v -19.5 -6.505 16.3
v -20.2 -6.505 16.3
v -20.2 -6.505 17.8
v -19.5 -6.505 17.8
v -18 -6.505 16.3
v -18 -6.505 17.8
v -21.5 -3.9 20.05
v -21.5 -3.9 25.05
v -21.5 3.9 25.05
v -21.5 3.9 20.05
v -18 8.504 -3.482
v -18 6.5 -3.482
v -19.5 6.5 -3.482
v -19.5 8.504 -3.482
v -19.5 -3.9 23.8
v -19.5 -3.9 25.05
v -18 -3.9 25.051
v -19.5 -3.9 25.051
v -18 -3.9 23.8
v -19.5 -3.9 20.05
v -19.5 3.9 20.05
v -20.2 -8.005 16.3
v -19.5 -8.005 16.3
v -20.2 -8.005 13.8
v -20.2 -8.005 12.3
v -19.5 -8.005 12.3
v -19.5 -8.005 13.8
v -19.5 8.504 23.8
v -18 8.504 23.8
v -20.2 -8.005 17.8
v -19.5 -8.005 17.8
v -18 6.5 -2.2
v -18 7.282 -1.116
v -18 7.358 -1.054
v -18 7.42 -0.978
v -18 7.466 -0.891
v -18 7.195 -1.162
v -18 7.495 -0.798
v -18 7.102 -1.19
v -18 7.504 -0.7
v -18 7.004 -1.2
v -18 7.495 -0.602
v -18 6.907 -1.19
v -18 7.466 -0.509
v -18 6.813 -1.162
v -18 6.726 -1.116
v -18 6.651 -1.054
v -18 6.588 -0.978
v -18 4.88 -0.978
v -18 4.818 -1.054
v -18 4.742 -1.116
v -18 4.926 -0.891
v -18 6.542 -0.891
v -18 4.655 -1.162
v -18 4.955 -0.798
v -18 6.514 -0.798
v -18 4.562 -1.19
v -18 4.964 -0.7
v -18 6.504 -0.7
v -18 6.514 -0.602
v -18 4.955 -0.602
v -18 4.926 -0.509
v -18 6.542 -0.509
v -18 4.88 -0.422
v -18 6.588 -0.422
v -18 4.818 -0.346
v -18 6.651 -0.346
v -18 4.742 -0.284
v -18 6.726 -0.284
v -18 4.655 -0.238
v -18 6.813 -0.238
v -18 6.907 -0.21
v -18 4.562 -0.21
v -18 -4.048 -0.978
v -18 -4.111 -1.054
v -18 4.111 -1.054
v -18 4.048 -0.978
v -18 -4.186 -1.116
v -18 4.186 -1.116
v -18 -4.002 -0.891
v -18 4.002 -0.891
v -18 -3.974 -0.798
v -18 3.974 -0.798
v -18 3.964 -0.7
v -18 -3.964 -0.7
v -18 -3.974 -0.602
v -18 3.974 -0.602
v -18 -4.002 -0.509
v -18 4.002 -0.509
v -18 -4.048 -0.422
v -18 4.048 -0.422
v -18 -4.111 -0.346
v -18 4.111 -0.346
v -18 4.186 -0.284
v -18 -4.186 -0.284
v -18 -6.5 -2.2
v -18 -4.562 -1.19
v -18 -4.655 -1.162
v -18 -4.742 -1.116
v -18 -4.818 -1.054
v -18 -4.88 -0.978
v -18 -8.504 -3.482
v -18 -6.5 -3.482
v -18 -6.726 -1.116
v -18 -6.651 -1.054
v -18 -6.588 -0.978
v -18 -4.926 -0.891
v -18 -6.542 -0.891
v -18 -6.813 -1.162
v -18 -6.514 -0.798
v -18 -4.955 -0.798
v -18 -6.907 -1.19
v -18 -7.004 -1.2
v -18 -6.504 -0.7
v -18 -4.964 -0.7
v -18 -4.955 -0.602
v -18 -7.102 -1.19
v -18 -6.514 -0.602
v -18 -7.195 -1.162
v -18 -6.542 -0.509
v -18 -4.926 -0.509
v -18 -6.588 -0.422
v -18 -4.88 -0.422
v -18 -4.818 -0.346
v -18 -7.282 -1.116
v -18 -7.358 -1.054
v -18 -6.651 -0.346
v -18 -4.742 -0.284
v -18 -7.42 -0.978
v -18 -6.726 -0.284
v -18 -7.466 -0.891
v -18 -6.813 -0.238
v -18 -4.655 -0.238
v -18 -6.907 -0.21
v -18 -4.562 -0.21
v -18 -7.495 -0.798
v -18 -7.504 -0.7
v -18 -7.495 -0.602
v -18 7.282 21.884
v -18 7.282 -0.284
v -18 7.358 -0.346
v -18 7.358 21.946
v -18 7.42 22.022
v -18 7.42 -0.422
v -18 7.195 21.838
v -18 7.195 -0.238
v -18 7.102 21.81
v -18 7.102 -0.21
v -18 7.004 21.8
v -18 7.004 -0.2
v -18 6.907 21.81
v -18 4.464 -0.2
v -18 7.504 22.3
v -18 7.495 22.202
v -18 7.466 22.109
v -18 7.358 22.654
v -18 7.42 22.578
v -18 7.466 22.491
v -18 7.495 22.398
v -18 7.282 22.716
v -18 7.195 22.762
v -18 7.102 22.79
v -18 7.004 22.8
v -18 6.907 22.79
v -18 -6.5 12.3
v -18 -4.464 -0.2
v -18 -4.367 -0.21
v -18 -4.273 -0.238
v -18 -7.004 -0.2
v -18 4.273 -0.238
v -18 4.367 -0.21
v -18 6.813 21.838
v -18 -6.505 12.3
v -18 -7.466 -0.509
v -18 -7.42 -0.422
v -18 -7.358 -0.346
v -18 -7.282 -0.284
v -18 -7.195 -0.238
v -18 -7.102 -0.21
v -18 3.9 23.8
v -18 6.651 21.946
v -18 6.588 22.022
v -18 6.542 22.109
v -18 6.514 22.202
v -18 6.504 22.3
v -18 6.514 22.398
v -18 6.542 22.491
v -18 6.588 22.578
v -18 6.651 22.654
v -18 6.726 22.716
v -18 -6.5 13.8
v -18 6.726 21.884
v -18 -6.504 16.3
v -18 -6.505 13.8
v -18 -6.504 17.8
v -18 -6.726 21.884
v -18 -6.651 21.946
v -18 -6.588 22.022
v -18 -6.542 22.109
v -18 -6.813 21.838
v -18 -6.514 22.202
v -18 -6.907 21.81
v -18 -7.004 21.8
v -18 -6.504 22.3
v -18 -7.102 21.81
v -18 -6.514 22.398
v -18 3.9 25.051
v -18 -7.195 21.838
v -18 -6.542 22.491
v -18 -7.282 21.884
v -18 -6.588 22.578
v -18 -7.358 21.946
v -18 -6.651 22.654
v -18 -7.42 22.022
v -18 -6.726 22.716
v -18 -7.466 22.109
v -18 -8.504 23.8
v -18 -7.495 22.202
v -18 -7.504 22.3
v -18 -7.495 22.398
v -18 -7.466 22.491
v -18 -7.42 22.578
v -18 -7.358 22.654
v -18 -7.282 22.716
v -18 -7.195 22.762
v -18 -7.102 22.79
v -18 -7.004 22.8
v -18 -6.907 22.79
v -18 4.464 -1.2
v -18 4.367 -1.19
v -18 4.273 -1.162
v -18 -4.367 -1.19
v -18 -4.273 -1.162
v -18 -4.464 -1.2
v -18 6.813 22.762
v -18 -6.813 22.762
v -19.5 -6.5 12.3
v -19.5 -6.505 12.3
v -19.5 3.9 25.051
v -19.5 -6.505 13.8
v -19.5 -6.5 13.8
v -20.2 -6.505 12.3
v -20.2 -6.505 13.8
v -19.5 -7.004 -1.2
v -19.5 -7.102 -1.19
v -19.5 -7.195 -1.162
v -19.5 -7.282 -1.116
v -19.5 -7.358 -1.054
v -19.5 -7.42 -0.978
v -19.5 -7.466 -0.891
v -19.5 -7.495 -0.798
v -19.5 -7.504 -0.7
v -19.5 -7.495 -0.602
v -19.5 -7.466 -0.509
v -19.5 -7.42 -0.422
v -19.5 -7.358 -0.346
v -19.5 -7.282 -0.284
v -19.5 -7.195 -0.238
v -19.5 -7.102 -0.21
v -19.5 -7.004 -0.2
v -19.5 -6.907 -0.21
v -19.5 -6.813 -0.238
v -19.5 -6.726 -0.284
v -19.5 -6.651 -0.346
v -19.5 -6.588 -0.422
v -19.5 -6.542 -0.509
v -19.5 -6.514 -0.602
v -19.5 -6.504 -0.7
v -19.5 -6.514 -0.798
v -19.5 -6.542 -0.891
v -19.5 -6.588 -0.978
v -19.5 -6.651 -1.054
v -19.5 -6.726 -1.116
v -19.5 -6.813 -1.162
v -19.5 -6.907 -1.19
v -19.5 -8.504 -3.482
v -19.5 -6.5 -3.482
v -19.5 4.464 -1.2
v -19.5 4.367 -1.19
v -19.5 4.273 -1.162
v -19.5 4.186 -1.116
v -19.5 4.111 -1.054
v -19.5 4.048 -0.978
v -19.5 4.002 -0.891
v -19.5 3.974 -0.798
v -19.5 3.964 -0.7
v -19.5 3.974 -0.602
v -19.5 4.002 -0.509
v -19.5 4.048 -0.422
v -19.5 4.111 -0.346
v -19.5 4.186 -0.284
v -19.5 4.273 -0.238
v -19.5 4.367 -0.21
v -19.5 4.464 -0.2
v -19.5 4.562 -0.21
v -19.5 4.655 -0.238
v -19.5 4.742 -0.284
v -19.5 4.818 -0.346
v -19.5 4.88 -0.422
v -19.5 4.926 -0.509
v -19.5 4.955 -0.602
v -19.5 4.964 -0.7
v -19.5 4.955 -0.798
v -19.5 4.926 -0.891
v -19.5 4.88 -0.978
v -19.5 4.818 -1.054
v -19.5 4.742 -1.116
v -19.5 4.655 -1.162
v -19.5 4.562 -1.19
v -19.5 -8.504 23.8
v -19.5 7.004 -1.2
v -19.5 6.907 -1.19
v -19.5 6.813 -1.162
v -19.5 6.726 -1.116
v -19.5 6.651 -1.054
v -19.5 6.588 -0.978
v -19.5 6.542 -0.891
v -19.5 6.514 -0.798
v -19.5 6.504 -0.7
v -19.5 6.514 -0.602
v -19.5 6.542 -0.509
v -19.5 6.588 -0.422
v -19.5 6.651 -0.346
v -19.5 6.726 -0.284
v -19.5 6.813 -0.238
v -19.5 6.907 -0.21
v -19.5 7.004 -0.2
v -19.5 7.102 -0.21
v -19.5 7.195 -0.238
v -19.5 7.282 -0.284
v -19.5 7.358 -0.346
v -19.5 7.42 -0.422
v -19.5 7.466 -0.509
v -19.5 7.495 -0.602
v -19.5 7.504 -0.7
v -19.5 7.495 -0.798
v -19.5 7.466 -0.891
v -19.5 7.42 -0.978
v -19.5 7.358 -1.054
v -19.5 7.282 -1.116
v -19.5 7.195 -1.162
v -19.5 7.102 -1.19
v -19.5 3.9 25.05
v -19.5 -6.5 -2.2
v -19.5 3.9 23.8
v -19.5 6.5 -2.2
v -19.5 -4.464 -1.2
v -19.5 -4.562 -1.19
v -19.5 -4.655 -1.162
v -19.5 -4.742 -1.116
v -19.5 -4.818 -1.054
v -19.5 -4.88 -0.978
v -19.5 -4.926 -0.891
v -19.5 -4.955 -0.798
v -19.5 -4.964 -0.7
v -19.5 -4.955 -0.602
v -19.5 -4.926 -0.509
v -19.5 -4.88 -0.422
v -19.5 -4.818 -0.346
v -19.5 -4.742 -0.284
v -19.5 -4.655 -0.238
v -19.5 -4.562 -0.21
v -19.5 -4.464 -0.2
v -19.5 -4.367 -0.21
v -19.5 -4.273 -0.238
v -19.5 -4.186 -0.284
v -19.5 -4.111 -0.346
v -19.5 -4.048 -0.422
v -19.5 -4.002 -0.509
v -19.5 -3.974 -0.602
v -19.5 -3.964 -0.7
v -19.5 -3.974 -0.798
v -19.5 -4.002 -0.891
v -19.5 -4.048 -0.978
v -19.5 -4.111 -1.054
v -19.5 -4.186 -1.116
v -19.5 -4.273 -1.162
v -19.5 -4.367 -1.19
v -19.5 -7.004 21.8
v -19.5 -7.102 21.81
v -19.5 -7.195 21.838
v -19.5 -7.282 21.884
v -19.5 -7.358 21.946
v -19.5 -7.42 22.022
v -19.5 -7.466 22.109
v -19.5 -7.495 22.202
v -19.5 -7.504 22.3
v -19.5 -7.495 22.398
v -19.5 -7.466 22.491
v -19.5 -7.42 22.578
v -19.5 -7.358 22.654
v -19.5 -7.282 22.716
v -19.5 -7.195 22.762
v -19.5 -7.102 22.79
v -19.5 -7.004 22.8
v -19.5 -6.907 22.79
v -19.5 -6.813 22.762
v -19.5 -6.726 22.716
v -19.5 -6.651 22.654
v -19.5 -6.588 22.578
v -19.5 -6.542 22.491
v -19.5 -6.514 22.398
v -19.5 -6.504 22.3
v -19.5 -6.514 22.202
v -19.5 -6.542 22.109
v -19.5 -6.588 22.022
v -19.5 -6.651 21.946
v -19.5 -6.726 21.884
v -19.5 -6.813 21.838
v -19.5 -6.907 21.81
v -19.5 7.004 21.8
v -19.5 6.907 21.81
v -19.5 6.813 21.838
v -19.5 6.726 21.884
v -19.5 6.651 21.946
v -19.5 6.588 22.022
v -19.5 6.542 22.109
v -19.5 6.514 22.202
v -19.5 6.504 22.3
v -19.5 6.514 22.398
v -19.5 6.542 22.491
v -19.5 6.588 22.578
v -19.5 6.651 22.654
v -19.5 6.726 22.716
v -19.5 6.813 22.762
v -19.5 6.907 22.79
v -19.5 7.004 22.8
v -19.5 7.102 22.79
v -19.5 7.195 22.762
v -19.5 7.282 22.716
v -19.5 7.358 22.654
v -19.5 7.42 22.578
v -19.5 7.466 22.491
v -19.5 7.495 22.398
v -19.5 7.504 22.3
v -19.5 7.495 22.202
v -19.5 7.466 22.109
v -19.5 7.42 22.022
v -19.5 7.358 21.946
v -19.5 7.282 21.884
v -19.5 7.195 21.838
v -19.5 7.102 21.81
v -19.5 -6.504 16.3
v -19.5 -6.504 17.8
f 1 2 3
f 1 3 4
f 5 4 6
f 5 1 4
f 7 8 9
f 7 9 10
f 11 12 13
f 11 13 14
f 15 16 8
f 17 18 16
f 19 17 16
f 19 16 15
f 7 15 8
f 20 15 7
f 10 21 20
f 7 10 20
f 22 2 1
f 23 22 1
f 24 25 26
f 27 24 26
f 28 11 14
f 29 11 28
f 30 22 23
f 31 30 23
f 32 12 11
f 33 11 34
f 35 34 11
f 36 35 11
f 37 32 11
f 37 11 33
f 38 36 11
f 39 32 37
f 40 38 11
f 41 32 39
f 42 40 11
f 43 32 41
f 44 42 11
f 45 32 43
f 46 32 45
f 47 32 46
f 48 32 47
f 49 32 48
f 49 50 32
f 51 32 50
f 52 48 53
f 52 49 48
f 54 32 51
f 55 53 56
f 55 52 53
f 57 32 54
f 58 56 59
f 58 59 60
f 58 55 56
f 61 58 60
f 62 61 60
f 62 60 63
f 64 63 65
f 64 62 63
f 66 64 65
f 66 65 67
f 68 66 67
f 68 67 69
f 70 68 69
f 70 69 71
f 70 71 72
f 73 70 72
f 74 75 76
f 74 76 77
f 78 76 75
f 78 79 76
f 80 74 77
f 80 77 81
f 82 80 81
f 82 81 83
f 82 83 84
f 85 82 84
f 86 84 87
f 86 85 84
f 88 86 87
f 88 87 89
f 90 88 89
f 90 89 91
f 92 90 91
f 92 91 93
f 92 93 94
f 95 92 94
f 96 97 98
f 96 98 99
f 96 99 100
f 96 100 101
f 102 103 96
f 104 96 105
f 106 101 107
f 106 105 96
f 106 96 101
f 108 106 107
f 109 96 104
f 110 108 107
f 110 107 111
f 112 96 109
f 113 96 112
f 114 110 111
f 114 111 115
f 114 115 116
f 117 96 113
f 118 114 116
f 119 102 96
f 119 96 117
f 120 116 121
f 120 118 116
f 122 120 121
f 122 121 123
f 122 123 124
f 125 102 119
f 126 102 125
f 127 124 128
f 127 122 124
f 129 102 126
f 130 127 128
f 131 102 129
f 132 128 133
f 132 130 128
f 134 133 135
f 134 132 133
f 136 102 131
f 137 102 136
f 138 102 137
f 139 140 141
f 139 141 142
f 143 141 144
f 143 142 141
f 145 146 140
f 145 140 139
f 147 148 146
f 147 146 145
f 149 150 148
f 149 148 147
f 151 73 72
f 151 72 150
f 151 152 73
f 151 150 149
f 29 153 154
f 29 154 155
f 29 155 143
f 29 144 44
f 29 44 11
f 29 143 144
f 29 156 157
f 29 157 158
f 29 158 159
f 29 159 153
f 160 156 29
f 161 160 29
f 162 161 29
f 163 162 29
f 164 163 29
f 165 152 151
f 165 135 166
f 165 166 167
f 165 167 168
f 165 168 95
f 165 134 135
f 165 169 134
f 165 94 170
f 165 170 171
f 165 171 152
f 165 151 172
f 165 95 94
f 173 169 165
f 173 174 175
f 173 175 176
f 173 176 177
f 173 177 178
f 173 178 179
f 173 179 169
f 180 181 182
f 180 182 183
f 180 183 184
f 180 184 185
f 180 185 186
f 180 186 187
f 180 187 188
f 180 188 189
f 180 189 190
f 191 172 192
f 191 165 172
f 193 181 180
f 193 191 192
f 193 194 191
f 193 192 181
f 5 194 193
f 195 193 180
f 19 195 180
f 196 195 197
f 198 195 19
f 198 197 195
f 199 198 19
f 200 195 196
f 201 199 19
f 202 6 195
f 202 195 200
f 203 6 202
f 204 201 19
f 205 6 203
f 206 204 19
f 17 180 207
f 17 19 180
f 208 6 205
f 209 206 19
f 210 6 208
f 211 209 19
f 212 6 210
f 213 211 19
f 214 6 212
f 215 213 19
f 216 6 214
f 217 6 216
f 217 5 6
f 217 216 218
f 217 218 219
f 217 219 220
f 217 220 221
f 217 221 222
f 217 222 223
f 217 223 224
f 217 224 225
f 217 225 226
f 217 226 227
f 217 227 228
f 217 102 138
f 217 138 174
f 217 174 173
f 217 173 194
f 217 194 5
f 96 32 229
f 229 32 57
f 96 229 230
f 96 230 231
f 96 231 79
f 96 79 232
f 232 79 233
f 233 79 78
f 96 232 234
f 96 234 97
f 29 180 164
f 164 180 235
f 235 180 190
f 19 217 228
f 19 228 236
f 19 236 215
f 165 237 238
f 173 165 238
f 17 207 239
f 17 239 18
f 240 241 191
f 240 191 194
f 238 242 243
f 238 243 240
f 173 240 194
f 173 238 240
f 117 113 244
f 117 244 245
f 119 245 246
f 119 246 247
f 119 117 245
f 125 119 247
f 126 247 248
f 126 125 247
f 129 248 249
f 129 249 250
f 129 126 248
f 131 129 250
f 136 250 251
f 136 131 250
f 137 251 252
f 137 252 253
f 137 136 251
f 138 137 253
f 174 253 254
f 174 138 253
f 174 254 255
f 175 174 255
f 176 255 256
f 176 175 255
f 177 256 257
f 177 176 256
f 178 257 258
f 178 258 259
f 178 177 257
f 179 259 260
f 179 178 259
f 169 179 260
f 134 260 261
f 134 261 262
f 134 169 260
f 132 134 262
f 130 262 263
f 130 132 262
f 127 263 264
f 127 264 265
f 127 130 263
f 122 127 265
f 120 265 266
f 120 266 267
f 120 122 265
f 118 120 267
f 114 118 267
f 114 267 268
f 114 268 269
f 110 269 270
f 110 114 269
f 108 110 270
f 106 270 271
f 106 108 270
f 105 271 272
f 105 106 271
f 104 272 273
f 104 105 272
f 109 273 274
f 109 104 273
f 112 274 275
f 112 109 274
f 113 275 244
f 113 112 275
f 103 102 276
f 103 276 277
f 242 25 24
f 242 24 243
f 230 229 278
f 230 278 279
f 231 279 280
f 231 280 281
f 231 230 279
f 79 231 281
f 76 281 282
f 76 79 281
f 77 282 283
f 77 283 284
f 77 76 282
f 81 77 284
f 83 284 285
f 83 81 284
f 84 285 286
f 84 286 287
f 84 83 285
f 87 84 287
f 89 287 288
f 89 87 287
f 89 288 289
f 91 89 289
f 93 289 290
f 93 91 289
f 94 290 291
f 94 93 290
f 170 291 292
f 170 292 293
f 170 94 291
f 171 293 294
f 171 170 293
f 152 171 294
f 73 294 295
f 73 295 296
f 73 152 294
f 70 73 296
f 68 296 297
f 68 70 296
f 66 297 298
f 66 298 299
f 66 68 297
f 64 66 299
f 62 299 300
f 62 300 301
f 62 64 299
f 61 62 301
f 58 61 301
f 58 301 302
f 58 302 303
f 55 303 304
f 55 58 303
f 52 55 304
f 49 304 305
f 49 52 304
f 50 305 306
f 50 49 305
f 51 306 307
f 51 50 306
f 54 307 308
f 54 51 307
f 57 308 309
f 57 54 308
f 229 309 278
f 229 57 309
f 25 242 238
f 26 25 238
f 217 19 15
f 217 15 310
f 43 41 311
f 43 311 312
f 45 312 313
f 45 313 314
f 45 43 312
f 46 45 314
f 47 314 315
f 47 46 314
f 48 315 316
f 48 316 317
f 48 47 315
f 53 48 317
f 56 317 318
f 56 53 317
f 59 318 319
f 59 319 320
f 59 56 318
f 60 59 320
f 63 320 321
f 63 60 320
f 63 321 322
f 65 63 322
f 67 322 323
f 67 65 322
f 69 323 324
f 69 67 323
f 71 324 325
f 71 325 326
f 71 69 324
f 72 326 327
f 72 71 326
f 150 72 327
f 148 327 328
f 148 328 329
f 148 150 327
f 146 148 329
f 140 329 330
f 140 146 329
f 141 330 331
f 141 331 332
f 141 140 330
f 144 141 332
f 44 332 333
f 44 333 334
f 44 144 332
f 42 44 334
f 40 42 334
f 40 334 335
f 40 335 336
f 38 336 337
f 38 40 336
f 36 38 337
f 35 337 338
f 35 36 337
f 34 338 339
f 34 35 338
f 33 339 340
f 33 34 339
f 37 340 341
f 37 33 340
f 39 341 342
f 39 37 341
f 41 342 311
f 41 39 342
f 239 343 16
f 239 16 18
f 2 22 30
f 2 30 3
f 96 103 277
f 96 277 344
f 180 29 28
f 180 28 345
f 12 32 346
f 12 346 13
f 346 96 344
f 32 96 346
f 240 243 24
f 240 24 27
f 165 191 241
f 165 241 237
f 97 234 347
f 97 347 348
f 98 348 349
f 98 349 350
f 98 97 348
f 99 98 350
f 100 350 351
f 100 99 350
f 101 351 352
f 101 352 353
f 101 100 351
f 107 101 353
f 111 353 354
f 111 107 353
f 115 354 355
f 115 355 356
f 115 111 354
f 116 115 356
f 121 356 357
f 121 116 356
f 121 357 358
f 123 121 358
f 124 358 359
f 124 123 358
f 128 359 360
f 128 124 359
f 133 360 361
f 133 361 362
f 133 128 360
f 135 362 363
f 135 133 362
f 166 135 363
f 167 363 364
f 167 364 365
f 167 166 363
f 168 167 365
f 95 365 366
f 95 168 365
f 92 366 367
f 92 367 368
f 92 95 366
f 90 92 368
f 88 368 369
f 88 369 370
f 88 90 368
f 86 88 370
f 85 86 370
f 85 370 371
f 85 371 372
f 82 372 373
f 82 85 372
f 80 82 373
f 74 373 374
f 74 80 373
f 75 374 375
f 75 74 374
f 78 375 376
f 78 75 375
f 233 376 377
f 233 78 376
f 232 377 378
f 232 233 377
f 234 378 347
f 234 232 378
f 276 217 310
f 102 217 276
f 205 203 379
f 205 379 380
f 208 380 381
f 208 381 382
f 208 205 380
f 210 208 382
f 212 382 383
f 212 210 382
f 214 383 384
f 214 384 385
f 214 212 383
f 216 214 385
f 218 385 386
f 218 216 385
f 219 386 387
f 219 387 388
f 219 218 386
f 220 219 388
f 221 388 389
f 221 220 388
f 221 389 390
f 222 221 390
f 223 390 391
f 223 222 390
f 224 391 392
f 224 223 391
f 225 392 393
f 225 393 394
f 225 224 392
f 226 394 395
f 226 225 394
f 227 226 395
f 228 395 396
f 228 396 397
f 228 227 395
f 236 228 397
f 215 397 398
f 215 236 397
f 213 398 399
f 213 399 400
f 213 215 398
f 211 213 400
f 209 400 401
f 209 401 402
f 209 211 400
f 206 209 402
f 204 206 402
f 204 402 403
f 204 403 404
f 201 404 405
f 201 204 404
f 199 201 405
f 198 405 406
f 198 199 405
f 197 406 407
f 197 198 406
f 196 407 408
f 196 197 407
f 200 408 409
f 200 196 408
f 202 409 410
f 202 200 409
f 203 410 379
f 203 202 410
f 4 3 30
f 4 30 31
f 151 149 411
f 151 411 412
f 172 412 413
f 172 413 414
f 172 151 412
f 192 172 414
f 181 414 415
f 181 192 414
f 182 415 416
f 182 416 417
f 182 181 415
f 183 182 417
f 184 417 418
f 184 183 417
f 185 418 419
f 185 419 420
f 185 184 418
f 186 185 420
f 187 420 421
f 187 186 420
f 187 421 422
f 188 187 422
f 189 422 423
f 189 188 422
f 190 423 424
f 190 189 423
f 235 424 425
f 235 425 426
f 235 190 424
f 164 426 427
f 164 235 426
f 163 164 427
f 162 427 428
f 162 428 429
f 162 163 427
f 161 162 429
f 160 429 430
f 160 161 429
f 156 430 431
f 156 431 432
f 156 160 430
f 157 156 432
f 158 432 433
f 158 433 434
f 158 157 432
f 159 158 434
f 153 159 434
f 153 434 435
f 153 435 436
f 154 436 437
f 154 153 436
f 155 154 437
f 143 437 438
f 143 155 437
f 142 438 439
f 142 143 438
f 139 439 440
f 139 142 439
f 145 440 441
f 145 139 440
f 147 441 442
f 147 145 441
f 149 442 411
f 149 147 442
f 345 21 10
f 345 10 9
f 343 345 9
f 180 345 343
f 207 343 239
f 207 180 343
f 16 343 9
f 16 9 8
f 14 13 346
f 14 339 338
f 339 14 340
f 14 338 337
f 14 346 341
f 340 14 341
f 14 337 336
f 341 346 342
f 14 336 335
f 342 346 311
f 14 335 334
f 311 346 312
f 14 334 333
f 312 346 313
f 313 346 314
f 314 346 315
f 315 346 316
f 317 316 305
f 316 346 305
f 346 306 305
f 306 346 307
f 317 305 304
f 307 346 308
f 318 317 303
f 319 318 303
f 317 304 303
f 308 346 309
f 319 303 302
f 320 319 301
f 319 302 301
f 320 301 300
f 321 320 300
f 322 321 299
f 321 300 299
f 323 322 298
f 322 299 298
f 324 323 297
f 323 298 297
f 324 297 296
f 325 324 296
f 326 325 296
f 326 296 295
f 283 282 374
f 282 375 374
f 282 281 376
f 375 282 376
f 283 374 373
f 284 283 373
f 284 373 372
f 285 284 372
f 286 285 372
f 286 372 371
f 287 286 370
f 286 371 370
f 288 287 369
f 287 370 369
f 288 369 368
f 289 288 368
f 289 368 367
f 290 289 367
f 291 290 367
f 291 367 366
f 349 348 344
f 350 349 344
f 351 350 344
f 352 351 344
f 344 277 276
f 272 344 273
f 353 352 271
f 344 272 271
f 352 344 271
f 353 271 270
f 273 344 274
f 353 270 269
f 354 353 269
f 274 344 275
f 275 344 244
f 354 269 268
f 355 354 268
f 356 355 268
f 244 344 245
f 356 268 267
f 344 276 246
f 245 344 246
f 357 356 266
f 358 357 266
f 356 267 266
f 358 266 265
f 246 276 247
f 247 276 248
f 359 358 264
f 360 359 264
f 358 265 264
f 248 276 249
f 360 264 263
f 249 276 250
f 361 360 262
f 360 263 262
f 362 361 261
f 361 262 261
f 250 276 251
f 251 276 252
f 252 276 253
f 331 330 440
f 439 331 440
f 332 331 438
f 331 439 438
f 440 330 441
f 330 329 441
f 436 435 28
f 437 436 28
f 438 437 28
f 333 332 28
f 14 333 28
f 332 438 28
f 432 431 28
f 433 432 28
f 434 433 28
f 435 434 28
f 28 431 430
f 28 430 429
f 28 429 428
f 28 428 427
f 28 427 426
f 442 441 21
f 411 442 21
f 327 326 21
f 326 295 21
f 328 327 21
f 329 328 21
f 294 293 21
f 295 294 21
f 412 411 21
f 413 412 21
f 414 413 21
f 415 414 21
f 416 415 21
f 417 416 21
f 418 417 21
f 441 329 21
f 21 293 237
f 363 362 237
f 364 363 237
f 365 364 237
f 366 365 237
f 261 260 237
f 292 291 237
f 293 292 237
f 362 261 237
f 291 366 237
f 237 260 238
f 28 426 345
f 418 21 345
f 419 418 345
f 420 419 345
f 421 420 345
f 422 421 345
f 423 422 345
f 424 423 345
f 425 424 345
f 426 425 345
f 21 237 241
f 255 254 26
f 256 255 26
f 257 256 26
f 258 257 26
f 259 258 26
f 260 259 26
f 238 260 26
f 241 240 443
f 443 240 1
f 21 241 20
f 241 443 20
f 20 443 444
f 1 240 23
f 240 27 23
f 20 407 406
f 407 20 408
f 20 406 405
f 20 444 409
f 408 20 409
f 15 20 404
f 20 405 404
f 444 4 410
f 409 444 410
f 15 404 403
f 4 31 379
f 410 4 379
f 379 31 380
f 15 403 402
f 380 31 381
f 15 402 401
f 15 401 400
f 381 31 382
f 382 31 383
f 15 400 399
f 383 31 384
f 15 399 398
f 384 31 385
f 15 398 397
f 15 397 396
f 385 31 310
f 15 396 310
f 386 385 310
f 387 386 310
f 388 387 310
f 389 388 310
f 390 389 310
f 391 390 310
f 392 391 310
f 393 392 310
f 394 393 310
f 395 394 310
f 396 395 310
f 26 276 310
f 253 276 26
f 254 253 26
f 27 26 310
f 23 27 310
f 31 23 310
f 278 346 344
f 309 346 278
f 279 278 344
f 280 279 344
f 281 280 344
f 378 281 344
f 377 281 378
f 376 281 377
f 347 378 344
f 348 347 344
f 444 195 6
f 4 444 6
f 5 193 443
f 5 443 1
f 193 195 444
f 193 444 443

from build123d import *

# Parameters (mm, degrees)
BOX003_W                  = 2.2
BOX003_H                  = 1.5
BOX003_DEPTH              = 1.5
BOX001_W                  = 5
BOX001_H                  = 7.8
BOX001_DEPTH              = 2.5
SKETCH006_R               = 0.5
SKETCH006_W               = 1.5
SKETCH006_H               = 1.5
PAD006_DEPTH              = 1.5
FUSION002_PITCH_ANGLE     = 90
FUSION002_PLACEMENT_ANGLE = -180
BOX002_W                  = 2.2
BOX002_H                  = 1.5
BOX002_DEPTH              = 1.5


with BuildPart() as cube002:
    # Box003 → Box003 (new body)
    with BuildSketch(Plane(origin=(-16.2, -8.005, 13.3), x_dir=(1, 0, 0), z_dir=(0, 0, 1))):
        with Locations((1.1, 0.75)):
            Rectangle(BOX003_W, BOX003_H)
    extrude(amount=BOX003_DEPTH)


with BuildPart() as cube:
    # Box001 → Box001 (new body)
    with BuildSketch(Plane(origin=(-14.25, -3.9, 1), x_dir=(1, 0, 0), z_dir=(0, 0, 1))):
        with Locations((2.5, 3.9)):
            Rectangle(BOX001_W, BOX001_H)
    extrude(amount=BOX001_DEPTH)


with BuildPart() as re:
    # Sketch006 → Pad006 (new body)
    with BuildSketch(Plane.XY):
        Polygon((-13, 8.504137), (14.28215, 8.504137), (14.28215, 6.5), (13, 6.5), (13, -6.5), (14.28215, -6.5), (14.28215, -8.504137), (-13, -8.504137), (-13, -3.9), (-14.250851, -3.9), (-14.250851, 3.9), (-13, 3.9), align=None)
        with Locations((-11.5, 7.004137)):
            Circle(SKETCH006_R, mode=Mode.SUBTRACT)
        with Locations((-11.5, -7.004137)):
            Circle(SKETCH006_R, mode=Mode.SUBTRACT)
        with Locations((11.5, 7.004137)):
            Circle(SKETCH006_R, mode=Mode.SUBTRACT)
        with Locations((11.5, 4.464137)):
            Circle(SKETCH006_R, mode=Mode.SUBTRACT)
        with Locations((11.5, -7.004137)):
            Circle(SKETCH006_R, mode=Mode.SUBTRACT)
        with Locations((11.5, -4.464137)):
            Circle(SKETCH006_R, mode=Mode.SUBTRACT)
        with Locations((-6.25, 7.254137)):
            Rectangle(SKETCH006_W, SKETCH006_H, mode=Mode.SUBTRACT)
        with Locations((-2.25, 7.25)):
            Rectangle(SKETCH006_W, SKETCH006_H, mode=Mode.SUBTRACT)
    extrude(amount=PAD006_DEPTH)

    # Fusion002: union Cube
    add(cube.part)


with BuildPart() as re_1:
    # Fusion002 pitch: moved
    add(re.part.rotate(Axis((0, 0, 0), (0, 1, 0)), FUSION002_PITCH_ANGLE))


with BuildPart() as re_2:
    # Fusion002 placement: moved
    add(re_1.part.moved(Location((-14, 0, 11.8))).rotate(Axis((-14, 0, 11.8), (0, 0, 1)), FUSION002_PLACEMENT_ANGLE))


with BuildPart() as recharger:
    # Box002 → Box002 (new body)
    with BuildSketch(Plane(origin=(-16.2, -8.005, 17.3), x_dir=(1, 0, 0), z_dir=(0, 0, 1))):
        with Locations((1.1, 0.75)):
            Rectangle(BOX002_W, BOX002_H)
    extrude(amount=BOX002_DEPTH)

    # Fusion003: union Cube002, Re
    add(cube002.part)
    add(re_2.part)


with BuildPart() as recharger_1:
    # Fusion003 placement: moved
    add(recharger.part.moved(Location((-4, 0, -1))))


solid = recharger_1.part
